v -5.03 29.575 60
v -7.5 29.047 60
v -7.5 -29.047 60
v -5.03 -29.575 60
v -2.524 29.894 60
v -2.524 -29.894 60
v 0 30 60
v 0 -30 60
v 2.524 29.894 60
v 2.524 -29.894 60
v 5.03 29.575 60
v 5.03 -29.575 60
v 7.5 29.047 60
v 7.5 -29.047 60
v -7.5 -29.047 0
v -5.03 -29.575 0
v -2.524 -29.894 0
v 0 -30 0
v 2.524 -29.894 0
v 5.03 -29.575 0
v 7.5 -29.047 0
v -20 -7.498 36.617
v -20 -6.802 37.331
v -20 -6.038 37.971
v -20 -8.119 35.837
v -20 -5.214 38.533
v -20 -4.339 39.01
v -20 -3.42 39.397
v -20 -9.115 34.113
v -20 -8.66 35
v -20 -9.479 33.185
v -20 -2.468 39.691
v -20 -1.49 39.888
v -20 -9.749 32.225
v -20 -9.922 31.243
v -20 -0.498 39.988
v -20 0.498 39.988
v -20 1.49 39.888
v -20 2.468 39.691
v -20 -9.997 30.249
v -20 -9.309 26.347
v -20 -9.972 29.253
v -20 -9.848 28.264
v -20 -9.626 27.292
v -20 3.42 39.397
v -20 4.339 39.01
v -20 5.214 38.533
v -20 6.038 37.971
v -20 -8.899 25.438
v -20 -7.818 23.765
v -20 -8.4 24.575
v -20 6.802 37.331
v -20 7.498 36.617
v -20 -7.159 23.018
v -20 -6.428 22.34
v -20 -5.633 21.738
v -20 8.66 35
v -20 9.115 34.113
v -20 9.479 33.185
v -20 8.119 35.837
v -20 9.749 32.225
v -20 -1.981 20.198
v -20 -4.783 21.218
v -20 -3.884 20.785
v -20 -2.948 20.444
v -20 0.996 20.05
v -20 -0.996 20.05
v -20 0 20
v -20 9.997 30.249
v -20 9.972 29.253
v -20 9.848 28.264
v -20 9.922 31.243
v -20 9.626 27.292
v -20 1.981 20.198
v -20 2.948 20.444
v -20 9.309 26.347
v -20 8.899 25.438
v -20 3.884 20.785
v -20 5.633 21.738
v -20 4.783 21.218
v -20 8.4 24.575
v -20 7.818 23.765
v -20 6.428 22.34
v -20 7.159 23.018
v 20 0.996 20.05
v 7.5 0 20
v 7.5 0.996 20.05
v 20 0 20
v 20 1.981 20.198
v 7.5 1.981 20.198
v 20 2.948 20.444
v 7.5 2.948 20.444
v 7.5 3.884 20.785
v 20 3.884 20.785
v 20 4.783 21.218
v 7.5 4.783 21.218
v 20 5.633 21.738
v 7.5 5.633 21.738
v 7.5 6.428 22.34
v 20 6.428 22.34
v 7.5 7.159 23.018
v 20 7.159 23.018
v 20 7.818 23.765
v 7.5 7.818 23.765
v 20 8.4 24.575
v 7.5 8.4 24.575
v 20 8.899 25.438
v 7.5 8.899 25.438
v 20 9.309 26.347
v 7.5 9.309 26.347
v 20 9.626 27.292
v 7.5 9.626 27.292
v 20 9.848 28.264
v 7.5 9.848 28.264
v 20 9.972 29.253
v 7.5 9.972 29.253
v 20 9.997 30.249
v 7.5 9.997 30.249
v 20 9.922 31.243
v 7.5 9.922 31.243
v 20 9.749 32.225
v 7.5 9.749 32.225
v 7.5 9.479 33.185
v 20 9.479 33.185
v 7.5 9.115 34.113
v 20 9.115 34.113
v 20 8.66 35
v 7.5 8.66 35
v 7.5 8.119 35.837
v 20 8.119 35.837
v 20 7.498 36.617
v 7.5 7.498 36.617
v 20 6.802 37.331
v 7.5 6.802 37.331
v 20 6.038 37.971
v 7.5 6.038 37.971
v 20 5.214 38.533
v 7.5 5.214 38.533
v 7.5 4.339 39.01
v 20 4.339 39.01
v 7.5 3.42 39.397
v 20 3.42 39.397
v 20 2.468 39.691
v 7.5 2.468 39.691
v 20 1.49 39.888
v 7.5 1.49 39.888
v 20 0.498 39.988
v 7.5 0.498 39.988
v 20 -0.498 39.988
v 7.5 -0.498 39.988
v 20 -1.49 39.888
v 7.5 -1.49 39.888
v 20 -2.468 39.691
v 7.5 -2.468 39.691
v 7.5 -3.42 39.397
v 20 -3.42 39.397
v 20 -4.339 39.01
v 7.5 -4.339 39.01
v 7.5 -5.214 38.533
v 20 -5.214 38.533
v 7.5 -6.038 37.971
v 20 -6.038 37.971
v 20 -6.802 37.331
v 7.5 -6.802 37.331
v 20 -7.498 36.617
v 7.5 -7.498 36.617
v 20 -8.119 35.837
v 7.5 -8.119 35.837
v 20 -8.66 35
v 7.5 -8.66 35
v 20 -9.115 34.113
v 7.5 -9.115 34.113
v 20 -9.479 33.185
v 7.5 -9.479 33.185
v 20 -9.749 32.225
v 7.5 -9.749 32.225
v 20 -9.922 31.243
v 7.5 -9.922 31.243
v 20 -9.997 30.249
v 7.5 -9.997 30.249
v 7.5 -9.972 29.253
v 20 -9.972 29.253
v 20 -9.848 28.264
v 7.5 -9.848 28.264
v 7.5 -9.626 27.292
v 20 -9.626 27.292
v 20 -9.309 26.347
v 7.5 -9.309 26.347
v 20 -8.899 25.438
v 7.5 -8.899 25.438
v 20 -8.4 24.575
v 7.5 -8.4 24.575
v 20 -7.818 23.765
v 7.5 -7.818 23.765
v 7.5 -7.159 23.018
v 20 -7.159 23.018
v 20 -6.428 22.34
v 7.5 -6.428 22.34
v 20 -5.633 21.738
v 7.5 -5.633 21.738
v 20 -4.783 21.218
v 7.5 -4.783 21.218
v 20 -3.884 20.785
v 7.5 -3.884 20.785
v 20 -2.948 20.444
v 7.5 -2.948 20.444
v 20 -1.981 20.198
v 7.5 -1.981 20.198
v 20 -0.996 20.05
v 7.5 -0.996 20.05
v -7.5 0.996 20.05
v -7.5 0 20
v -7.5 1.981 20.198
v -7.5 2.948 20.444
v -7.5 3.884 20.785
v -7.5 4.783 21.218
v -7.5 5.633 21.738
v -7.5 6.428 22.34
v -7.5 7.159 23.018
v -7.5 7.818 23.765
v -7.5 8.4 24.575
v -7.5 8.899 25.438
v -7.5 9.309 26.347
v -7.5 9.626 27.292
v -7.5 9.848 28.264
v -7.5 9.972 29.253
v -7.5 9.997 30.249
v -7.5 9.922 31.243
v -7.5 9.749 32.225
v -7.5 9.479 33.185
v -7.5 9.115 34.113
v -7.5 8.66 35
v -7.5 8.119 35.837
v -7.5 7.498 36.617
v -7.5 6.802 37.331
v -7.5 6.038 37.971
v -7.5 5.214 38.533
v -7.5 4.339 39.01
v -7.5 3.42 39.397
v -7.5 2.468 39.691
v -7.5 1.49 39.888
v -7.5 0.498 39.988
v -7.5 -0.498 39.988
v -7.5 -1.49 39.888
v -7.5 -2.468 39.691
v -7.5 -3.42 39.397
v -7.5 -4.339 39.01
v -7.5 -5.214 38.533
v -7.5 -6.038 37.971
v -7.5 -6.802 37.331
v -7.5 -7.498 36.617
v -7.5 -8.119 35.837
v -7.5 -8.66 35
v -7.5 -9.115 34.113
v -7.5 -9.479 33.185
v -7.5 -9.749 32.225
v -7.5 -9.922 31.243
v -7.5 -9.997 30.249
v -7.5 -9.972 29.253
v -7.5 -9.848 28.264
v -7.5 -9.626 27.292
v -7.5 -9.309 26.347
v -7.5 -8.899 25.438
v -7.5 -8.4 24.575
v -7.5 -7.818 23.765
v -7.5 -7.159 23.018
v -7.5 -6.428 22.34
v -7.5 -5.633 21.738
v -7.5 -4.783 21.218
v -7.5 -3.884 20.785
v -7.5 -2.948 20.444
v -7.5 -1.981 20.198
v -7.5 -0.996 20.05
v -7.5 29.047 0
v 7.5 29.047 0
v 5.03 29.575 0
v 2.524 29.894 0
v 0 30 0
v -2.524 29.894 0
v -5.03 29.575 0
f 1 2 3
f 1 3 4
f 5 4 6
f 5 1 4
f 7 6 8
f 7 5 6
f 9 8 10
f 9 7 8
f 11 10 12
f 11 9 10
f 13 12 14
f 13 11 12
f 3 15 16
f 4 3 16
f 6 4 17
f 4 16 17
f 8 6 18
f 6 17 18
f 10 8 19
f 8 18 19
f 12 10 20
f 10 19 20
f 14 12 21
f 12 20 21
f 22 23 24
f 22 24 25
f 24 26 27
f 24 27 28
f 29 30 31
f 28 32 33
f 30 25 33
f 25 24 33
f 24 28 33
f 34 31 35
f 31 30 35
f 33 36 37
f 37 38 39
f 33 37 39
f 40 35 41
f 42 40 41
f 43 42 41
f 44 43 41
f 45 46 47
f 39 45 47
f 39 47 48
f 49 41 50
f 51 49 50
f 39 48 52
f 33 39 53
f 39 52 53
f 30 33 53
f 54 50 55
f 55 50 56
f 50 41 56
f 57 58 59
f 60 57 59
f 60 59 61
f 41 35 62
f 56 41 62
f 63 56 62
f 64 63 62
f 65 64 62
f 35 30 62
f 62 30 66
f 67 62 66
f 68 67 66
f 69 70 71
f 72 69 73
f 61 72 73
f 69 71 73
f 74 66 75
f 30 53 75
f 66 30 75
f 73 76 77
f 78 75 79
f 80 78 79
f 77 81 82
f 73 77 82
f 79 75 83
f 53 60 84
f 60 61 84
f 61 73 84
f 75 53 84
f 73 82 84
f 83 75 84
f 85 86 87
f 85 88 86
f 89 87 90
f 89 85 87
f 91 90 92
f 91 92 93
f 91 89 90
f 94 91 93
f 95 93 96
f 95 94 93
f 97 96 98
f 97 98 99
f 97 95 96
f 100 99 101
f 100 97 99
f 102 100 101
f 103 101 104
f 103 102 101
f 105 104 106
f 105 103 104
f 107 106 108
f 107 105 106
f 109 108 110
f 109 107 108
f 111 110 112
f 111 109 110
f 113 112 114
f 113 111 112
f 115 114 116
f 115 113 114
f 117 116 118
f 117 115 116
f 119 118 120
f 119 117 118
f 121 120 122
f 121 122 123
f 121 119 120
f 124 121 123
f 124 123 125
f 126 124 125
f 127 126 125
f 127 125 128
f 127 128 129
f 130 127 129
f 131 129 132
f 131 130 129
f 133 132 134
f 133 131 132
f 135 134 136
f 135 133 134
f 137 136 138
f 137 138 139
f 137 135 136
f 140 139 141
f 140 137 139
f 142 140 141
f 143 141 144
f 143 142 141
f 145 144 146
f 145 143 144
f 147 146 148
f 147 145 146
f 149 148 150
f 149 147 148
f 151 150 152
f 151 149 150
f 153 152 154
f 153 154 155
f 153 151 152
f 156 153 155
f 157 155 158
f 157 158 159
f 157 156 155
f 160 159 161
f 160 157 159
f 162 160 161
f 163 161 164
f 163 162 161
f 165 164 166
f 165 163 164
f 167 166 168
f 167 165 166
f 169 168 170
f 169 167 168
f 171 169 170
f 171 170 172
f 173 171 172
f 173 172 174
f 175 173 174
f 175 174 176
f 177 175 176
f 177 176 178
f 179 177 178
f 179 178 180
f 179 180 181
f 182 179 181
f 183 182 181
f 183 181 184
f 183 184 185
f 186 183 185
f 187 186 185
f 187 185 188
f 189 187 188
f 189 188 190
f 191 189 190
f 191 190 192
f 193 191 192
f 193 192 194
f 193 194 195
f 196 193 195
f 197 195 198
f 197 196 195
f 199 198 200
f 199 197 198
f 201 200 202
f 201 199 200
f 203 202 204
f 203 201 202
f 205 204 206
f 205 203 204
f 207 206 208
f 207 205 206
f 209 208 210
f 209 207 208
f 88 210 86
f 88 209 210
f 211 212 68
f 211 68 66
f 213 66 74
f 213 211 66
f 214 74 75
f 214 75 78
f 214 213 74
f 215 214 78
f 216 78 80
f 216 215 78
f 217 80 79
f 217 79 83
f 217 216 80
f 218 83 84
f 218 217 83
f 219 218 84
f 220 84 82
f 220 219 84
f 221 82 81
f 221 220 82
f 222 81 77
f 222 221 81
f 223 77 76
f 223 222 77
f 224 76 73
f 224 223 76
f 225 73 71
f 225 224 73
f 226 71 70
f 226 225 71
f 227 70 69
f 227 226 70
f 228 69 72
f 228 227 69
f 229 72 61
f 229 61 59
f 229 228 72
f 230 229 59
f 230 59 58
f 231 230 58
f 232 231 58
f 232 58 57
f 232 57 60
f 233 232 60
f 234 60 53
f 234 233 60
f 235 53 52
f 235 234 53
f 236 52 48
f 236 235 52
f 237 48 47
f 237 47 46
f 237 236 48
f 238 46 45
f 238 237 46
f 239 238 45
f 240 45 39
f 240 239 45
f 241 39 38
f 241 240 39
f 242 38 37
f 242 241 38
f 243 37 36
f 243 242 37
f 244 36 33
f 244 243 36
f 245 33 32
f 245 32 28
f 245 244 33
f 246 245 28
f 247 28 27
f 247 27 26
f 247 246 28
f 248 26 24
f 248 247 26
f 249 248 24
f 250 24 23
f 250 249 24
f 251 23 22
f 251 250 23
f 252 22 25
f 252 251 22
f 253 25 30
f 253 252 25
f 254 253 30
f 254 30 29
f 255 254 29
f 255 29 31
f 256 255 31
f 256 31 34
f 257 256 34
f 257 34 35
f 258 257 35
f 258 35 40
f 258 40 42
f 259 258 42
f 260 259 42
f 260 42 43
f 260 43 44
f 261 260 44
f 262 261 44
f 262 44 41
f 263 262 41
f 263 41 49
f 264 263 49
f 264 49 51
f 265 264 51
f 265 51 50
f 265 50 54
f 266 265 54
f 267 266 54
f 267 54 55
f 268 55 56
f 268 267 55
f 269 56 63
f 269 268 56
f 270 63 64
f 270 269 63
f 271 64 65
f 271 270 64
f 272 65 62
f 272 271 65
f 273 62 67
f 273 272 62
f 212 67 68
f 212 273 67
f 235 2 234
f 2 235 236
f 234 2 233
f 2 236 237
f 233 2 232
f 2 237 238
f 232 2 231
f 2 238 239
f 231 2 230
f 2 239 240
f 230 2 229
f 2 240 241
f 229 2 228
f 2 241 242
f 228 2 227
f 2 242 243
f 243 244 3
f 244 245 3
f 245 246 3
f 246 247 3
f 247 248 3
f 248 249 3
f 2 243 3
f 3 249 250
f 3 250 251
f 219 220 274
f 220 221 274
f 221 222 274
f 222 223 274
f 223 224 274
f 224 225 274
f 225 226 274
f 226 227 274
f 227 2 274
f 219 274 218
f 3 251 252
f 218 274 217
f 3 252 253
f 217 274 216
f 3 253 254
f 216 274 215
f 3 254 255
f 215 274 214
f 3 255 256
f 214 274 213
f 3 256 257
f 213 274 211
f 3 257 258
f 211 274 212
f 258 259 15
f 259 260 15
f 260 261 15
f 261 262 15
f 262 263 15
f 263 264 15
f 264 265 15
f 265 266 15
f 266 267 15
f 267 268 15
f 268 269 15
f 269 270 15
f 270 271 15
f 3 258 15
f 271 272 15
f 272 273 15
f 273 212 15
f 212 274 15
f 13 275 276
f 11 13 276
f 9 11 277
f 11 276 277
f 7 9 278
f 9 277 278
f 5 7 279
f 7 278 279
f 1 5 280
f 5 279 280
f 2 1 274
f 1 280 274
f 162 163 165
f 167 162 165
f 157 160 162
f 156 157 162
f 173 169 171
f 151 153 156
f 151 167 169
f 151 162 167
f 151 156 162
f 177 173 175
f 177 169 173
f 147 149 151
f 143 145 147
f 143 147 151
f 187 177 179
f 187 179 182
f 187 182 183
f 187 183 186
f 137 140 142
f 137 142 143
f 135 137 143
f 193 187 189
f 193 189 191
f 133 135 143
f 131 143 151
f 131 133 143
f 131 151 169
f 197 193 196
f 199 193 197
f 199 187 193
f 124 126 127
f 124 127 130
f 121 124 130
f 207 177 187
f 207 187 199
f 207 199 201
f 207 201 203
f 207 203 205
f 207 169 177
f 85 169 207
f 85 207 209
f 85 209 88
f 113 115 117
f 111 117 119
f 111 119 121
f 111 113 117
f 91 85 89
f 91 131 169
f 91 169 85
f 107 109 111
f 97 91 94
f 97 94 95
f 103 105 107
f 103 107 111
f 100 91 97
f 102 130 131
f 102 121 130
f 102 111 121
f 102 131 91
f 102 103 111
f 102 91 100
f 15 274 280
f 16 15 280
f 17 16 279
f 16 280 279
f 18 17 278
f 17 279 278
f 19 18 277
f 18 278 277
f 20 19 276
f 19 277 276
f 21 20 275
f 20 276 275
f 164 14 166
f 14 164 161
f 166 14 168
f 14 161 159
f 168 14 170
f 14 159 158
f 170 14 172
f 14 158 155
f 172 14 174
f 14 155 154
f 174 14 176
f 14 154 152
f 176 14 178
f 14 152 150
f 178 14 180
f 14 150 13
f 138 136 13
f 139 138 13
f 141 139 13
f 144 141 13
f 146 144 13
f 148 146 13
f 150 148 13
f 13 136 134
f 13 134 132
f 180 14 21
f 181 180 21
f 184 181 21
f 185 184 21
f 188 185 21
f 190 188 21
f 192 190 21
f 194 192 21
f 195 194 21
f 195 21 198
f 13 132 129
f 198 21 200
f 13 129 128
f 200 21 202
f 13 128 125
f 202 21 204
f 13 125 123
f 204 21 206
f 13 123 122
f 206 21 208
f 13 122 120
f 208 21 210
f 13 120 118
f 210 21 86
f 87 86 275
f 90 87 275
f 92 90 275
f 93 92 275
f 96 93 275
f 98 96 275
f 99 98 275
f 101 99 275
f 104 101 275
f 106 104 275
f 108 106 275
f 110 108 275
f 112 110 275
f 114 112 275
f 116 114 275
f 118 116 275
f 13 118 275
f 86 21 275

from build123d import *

# Parameters (mm, degrees)
BOSS_EXTRUDE1_DEPTH = 60
SKETCH2_TOOL_BASE_R = 10
BOSS_EXTRUDE2_DEPTH = 20


with BuildPart() as part:
    # sketch1_tool_base → Boss-Extrude1 (new body)
    with BuildSketch(Plane.XY):
        with BuildLine():
            Line((-7.5, 29.047375097), (-7.5, -29.047375097))
            ThreePointArc((-7.5, -29.047375097), (0, -30), (7.5, -29.047375097))
            Line((7.5, -29.047375097), (7.5, 29.047375097))
            ThreePointArc((7.5, 29.047375097), (0, 30), (-7.5, 29.047375097))
        make_face()
    extrude(amount=BOSS_EXTRUDE1_DEPTH)

    # sketch2_tool_base → Boss-Extrude2 (add, symmetric)
    with BuildSketch(Plane(origin=(0, 0, 0), x_dir=(0, 0, -1), z_dir=(1, 0, 0))):
        with Locations((-30, 0)):
            Circle(SKETCH2_TOOL_BASE_R)
    extrude(amount=BOSS_EXTRUDE2_DEPTH, both=True)


solid = part.part
